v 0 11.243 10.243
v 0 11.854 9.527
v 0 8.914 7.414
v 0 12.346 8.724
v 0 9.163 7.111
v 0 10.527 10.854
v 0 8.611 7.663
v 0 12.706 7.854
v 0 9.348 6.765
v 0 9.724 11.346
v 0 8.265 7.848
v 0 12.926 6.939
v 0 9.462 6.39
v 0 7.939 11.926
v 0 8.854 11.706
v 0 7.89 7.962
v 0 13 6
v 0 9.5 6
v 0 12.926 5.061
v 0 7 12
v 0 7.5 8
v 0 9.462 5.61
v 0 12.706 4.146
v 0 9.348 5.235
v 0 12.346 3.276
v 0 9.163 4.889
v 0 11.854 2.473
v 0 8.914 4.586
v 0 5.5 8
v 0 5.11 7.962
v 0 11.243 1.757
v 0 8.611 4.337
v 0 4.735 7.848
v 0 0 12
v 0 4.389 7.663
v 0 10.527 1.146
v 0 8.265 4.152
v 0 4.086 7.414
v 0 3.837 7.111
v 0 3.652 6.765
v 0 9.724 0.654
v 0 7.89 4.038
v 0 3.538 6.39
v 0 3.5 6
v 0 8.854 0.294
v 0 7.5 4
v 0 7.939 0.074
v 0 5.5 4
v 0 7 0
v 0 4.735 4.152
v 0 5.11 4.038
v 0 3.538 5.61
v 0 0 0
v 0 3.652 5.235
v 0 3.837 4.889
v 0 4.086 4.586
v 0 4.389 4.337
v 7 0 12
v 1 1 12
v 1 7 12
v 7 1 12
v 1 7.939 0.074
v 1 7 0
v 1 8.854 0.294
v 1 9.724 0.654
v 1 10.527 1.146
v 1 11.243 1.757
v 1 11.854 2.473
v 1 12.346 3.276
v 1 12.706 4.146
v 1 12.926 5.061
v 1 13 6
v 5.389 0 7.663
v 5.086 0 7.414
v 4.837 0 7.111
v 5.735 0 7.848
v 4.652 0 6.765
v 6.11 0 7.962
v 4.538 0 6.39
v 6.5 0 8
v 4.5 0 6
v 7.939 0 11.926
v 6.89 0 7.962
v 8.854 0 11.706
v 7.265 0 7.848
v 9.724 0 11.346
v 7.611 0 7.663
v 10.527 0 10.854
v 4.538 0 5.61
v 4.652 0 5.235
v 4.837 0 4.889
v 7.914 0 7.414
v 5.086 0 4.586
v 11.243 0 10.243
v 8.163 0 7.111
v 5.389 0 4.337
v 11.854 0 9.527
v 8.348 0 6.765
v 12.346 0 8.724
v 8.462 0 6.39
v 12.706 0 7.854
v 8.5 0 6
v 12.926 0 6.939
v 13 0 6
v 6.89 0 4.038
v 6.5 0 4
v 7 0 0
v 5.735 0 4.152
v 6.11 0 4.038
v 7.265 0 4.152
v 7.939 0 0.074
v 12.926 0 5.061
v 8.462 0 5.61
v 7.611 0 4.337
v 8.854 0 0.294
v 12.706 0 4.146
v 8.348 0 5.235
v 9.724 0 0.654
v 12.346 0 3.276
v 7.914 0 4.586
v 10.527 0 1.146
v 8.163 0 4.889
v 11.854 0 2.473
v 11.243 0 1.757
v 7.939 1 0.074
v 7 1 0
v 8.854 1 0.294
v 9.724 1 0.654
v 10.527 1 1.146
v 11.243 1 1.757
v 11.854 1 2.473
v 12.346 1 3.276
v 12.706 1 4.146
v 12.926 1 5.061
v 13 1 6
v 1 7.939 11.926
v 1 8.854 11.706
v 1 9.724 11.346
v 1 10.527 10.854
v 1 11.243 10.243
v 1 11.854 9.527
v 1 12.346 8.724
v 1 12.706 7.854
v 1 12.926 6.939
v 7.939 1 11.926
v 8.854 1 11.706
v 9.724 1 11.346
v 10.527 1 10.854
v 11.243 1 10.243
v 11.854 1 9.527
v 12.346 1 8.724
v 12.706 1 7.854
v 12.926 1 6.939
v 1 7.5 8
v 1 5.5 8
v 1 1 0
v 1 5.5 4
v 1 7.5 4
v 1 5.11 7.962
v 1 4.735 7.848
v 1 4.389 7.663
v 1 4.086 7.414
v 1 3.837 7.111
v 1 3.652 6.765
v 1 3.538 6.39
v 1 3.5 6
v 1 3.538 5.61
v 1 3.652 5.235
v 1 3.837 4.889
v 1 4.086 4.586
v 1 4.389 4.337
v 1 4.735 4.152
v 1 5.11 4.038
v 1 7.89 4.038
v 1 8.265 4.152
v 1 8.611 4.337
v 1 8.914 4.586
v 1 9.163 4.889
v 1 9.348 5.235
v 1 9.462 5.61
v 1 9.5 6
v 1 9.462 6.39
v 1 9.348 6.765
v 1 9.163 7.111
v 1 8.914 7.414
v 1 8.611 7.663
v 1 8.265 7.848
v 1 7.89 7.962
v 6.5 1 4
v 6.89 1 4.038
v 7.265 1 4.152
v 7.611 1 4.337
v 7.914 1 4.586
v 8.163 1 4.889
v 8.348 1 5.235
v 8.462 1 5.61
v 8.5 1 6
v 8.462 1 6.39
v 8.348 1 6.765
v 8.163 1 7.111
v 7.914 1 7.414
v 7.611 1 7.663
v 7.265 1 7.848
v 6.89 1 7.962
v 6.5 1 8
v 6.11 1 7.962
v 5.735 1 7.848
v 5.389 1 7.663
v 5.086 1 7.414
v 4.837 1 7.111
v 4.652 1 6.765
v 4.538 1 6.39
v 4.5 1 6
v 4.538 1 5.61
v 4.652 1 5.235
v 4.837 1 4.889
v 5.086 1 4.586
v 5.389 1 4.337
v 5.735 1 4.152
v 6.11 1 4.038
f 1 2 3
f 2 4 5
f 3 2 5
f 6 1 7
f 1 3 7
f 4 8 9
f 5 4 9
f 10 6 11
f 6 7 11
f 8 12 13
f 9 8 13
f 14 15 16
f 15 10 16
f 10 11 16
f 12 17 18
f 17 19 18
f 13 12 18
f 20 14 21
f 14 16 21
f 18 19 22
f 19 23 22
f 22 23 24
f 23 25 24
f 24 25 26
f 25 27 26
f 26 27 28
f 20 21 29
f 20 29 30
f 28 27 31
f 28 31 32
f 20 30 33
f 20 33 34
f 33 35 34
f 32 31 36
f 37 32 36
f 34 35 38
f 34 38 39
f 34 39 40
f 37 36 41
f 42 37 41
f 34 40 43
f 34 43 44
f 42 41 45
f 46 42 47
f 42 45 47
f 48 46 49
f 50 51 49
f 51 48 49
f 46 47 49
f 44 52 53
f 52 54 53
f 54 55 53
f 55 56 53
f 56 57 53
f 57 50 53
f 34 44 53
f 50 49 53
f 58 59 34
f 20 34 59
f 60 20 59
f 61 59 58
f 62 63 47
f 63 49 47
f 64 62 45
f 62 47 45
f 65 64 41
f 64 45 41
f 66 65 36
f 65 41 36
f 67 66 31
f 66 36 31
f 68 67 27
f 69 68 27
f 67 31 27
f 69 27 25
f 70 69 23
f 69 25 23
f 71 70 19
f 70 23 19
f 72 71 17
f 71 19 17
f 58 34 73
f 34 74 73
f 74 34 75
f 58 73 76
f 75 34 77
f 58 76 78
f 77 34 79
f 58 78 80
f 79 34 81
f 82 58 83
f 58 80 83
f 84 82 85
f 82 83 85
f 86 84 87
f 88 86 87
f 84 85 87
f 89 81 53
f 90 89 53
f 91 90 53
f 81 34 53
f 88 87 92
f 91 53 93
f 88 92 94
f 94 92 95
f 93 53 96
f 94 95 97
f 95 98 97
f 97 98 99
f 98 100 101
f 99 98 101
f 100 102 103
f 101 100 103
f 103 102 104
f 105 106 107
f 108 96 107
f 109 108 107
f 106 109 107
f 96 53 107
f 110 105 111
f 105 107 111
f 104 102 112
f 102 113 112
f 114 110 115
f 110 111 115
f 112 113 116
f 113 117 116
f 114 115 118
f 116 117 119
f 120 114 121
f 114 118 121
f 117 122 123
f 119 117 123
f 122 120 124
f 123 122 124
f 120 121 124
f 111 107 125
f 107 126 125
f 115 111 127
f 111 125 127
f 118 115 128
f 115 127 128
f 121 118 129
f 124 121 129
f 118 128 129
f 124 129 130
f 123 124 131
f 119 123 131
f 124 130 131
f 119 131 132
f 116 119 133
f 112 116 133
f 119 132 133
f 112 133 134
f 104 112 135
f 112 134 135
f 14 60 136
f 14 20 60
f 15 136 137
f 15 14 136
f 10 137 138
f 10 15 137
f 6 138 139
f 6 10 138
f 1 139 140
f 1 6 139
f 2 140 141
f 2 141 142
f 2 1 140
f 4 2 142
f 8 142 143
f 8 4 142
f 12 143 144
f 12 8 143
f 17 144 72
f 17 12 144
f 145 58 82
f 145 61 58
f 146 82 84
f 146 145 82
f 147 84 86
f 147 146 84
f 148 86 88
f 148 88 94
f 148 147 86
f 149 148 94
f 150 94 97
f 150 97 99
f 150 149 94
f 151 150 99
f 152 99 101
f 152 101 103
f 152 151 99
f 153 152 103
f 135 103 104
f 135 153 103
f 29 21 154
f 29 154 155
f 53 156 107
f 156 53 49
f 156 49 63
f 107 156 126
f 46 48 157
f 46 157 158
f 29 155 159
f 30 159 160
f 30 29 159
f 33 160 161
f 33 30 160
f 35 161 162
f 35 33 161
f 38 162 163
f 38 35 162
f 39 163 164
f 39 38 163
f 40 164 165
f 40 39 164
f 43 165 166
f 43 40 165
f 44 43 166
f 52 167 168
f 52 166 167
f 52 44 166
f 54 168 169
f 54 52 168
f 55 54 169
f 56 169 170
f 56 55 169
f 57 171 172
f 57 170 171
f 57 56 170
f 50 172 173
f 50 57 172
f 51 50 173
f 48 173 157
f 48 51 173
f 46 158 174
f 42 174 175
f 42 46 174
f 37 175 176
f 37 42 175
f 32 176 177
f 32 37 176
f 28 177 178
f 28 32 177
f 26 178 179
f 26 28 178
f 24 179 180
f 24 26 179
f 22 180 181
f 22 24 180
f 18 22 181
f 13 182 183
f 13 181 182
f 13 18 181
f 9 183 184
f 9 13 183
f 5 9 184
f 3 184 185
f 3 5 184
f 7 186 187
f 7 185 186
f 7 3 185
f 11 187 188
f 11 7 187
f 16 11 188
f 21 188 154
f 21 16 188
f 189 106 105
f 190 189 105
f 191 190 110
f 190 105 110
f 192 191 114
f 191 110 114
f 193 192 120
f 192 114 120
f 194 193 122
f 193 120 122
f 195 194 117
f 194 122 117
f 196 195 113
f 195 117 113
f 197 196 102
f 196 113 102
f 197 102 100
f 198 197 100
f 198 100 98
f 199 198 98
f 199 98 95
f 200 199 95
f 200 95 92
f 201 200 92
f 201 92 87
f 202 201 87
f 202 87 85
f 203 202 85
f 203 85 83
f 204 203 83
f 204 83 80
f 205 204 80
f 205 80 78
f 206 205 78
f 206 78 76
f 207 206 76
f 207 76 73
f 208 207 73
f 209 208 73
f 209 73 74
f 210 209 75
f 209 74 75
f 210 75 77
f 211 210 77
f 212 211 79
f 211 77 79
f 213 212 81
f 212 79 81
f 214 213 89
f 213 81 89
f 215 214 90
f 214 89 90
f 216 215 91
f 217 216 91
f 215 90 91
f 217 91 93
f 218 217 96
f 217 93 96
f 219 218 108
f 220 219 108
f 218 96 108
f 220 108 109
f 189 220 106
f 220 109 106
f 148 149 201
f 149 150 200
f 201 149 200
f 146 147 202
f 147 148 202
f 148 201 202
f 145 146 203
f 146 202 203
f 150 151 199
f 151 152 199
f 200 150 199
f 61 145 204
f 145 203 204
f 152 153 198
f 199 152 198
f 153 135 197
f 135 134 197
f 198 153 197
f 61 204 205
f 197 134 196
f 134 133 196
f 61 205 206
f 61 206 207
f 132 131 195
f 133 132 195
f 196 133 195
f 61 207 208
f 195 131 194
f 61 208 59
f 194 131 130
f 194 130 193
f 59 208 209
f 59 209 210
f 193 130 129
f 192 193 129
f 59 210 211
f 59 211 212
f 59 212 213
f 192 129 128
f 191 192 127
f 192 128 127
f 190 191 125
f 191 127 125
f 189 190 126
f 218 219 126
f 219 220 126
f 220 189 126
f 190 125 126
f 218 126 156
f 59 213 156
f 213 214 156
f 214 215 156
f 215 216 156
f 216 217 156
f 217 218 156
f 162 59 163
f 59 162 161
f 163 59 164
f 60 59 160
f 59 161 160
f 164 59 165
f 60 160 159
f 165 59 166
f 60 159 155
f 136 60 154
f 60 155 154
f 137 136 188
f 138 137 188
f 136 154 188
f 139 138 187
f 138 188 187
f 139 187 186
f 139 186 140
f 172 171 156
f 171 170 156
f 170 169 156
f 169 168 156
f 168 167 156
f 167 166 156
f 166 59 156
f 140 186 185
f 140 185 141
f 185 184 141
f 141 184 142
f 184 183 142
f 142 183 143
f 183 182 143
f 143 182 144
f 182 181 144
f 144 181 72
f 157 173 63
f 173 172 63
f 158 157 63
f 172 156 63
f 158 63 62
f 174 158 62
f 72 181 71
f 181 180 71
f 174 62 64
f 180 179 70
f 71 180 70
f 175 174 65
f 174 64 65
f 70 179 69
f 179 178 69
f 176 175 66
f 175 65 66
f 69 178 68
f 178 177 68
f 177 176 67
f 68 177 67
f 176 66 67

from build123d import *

# Parameters (mm, degrees)
BOSS_EXTRUDE1_DEPTH = 12
CUT_EXTRUDE1_DEPTH  = 22.9544984
SKETCH3_R           = 2
CUT_EXTRUDE2_DEPTH  = 22.9544984
FILLET1_R           = 6


with BuildPart() as part:
    # Sketch1 → Boss-Extrude1 (new body)
    with BuildSketch(Plane.XY):
        Polygon((0, 0), (13, 0), (13, 1), (1, 1), (1, 13), (0, 13), align=None)
    extrude(amount=BOSS_EXTRUDE1_DEPTH)

    # Sketch2 → Cut-Extrude1 (cut, through all)
    with BuildSketch(Plane.ZY):
        with BuildLine():
            Line((4, 5.5), (4, 7.5))
            ThreePointArc((4, 7.5), (6, 9.5), (8, 7.5))
            Line((8, 7.5), (8, 5.5))
            ThreePointArc((8, 5.5), (6, 3.5), (4, 5.5))
        make_face()
    extrude(amount=-CUT_EXTRUDE1_DEPTH, mode=Mode.SUBTRACT)

    # Sketch3 → Cut-Extrude2 (cut, through all)
    with BuildSketch(Plane.XZ):
        with Locations(Location((6.5, 6, 0), (0, 0, 270))):
            Circle(SKETCH3_R)
    extrude(amount=-CUT_EXTRUDE2_DEPTH, mode=Mode.SUBTRACT)

    # Fillet1
    fillet1_edges = [part.edges().sort_by_distance(p)[0] for p in [
        (0.5, 13, 0),
        (13, 0.5, 0),
        (13, 0.5, 12),
        (0.5, 13, 12),
    ]]
    fillet(fillet1_edges, radius=FILLET1_R - 0.0001)  # a hair under: the kernel refuses the full size


solid = part.part
